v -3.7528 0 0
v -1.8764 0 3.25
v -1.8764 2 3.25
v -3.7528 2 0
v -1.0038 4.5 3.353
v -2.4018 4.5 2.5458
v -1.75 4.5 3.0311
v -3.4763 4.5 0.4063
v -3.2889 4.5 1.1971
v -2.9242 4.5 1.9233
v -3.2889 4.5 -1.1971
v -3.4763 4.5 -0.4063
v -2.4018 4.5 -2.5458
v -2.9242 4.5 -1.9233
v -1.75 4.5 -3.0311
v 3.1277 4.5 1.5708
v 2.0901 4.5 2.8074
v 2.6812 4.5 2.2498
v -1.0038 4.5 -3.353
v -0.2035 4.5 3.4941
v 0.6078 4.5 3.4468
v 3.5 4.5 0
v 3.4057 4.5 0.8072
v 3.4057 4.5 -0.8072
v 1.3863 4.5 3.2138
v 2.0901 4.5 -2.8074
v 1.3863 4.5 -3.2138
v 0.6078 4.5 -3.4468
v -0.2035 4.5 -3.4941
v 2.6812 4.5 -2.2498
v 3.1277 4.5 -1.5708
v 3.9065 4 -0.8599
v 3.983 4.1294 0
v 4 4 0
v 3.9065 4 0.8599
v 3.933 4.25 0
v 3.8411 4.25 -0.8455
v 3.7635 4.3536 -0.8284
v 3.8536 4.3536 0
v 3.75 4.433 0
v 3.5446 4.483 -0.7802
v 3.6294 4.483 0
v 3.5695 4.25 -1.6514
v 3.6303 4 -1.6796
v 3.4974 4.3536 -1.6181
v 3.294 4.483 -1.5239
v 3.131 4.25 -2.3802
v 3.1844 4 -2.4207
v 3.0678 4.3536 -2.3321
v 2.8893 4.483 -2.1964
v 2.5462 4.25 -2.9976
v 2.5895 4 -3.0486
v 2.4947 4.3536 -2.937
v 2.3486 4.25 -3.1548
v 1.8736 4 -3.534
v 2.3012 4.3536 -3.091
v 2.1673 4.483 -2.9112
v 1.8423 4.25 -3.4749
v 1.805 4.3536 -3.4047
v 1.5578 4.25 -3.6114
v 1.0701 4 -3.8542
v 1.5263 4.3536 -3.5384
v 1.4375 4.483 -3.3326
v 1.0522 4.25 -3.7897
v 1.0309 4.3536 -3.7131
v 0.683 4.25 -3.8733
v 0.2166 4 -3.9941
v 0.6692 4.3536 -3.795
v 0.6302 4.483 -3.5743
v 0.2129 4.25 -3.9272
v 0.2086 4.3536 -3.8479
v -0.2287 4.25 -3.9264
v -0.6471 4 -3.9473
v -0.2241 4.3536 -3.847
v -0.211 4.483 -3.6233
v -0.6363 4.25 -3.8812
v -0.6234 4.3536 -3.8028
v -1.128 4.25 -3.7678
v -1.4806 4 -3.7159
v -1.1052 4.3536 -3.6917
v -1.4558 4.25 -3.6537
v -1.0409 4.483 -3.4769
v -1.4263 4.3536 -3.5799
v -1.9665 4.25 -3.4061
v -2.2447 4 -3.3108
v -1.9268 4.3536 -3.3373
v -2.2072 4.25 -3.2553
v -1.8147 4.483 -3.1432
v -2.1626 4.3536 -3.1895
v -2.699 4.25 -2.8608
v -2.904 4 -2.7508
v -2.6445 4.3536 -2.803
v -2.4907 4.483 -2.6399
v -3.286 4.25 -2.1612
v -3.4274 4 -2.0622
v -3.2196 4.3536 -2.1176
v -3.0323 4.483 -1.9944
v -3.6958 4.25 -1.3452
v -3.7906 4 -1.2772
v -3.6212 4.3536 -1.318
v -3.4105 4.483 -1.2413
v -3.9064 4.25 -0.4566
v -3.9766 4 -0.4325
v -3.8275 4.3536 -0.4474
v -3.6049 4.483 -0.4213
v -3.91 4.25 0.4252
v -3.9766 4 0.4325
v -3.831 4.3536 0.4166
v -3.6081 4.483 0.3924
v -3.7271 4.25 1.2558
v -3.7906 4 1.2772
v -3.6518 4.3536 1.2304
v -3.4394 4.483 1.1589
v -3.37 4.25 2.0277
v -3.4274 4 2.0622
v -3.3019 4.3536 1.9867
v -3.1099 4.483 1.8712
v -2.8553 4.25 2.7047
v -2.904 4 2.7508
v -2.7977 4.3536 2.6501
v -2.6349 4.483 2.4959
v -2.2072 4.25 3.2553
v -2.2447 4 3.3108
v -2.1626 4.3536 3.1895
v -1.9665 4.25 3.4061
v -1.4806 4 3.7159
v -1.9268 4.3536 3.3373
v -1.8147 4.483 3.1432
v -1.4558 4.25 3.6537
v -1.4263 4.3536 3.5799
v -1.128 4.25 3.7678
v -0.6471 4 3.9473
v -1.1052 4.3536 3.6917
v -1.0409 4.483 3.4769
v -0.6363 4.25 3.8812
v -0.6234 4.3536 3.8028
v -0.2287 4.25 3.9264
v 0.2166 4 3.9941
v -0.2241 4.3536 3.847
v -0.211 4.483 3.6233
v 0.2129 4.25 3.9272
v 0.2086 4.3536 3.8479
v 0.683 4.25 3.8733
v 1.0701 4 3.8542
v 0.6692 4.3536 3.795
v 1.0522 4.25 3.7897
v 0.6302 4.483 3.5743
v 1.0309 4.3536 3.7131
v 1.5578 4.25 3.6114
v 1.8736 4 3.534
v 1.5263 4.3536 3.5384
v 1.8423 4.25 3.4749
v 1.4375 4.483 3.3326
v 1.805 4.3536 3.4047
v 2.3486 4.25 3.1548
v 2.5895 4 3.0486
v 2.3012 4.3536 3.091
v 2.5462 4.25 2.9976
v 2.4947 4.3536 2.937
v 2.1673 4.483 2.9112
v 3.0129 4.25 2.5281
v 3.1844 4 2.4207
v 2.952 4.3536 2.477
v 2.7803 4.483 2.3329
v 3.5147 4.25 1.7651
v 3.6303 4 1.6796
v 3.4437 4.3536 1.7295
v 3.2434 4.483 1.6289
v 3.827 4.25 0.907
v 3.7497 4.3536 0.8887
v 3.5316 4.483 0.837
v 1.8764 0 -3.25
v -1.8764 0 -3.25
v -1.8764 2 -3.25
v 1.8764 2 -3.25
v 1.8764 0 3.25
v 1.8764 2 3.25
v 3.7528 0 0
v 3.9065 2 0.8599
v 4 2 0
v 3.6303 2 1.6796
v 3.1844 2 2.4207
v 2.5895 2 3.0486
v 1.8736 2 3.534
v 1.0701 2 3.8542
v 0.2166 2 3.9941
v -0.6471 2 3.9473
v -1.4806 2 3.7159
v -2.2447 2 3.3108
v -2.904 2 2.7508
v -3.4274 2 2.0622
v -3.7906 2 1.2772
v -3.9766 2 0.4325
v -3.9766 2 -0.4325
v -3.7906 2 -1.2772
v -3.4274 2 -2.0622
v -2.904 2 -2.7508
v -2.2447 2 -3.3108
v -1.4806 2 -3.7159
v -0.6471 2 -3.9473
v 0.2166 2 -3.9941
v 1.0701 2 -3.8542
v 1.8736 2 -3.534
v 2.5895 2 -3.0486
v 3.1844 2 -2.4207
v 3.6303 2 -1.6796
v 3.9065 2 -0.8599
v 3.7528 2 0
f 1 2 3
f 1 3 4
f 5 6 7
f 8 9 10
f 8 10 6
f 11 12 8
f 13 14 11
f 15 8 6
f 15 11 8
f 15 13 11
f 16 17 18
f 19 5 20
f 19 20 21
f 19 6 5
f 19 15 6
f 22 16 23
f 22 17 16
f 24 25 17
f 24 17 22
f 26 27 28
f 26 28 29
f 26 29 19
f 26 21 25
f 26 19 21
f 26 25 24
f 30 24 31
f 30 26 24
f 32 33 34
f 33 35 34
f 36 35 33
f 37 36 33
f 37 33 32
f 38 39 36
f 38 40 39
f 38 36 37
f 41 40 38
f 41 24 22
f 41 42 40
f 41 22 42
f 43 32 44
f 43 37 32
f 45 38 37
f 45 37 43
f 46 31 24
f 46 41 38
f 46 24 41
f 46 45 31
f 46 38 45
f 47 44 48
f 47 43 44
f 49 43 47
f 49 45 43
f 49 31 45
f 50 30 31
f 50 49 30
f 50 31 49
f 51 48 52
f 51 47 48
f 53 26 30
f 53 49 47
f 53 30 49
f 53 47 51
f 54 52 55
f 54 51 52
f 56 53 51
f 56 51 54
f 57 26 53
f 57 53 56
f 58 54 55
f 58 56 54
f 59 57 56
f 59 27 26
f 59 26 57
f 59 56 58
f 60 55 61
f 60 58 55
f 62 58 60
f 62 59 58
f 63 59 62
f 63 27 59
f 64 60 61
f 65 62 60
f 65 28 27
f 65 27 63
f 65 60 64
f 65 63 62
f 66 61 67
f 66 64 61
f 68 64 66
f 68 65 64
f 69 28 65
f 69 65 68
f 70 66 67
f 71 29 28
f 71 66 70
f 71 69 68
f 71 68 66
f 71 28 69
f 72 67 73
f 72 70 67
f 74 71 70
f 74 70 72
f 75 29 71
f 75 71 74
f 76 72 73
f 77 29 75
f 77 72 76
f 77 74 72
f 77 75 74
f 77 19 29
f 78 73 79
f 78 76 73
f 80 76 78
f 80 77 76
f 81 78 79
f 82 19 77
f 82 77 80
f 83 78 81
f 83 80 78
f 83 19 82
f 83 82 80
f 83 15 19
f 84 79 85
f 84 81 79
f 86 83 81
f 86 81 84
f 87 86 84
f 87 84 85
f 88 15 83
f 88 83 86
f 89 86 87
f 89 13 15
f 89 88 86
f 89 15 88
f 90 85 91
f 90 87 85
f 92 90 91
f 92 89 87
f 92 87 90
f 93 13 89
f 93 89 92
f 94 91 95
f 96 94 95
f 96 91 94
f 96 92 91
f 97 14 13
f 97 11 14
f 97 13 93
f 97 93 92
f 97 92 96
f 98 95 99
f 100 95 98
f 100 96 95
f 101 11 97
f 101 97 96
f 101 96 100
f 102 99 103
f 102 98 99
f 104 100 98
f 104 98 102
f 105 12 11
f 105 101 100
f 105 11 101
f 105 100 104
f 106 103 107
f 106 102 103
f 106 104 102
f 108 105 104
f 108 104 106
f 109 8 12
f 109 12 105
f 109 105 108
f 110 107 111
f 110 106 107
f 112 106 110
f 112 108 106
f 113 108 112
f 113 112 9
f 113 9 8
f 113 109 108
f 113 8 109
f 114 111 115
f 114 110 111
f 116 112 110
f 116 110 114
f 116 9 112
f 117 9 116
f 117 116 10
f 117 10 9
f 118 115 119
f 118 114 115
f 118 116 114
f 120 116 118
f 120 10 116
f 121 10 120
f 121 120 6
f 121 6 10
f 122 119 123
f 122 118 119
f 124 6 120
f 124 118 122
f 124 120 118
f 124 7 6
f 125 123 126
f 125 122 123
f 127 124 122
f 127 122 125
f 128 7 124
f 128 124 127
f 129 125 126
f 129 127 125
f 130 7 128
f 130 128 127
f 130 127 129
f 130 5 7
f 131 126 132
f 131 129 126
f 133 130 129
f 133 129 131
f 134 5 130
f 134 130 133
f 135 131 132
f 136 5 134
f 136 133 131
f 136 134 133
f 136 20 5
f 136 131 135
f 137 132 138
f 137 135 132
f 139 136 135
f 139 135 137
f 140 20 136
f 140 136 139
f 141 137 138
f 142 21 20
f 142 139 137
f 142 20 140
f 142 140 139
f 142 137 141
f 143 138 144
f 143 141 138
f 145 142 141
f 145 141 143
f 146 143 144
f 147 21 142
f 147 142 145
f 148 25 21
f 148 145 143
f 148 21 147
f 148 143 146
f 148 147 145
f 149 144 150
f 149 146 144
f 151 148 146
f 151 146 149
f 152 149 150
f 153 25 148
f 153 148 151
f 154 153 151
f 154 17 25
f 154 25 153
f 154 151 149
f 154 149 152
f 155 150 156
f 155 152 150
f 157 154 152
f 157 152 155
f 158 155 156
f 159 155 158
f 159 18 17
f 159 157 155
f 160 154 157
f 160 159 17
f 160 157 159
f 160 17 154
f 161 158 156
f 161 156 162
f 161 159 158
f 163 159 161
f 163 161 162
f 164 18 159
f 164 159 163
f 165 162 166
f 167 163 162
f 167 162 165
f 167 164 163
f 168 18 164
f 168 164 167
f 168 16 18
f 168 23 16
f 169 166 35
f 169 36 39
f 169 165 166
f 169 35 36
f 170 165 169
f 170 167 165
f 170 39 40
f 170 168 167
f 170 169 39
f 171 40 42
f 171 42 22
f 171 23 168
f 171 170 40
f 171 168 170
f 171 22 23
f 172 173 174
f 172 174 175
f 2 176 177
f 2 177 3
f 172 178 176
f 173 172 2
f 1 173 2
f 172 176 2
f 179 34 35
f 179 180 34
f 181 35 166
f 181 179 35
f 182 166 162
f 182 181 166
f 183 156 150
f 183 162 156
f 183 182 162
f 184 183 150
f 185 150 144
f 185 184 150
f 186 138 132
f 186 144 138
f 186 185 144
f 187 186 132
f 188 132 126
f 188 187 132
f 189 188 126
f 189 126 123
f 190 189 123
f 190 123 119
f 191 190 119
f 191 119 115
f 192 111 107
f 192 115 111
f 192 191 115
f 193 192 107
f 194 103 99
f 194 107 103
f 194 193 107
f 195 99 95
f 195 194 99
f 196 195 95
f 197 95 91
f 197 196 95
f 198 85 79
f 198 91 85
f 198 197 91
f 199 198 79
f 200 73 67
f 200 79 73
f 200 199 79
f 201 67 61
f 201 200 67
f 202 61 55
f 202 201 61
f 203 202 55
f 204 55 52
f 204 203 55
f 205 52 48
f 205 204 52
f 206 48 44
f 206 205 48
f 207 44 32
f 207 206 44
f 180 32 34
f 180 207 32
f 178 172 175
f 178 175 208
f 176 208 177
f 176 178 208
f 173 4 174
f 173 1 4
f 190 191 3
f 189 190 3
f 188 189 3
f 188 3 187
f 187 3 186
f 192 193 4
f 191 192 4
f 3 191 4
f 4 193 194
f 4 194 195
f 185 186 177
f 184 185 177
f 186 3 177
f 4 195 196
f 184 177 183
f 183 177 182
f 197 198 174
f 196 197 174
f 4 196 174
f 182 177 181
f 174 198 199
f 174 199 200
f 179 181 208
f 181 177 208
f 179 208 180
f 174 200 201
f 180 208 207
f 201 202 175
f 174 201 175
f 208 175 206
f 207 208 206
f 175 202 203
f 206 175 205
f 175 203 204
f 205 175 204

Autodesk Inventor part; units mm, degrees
ref_plane "YZ Plane" through (0, 0, 0) normal (1, 0, 0) x (0, 1, 0)
ref_plane "XZ Plane" through (0, 0, 0) normal (0, 1, 0) x (-1, 0, 0)
ref_plane "XY Plane" through (0, 0, 0) normal (0, 0, 1) x (1, 0, 0)
sketch "Sketch1" plane through (0, 0, 0) normal (0, 1, 0) x (-1, 0, 0)
  line L0 (3.7528, 0) -> (1.8764, -3.25)
  line L1 (1.8764, -3.25) -> (-1.8764, -3.25)
  line L2 (-1.8764, -3.25) -> (-3.7528, 0)
  line L3 (-3.7528, 0) -> (-1.8764, 3.25)
  line L4 (-1.8764, 3.25) -> (1.8764, 3.25)
  line L5 (1.8764, 3.25) -> (3.7528, 0)
  point P0 (0, 0)
  point P1 (0, 0)
  dimension "d0" = 6.5
extrude "Extrusion1" add sketch "Sketch1" along normal blind 2
sketch "Sketch2" plane through (0, 2, 0) normal (0, 1, 0) x (1, 0, 0)
  circle A0 centre (0, 0) radius 4
  dimension "d3" = 8
extrude "Extrusion2" add sketch "Sketch2" along normal blind 2.5
fillet "Fillet1" radius 0.5 1 edges at (-4, 4.5, 0)
properties part number "servo_nut_2_for_FatShark_180MG"
